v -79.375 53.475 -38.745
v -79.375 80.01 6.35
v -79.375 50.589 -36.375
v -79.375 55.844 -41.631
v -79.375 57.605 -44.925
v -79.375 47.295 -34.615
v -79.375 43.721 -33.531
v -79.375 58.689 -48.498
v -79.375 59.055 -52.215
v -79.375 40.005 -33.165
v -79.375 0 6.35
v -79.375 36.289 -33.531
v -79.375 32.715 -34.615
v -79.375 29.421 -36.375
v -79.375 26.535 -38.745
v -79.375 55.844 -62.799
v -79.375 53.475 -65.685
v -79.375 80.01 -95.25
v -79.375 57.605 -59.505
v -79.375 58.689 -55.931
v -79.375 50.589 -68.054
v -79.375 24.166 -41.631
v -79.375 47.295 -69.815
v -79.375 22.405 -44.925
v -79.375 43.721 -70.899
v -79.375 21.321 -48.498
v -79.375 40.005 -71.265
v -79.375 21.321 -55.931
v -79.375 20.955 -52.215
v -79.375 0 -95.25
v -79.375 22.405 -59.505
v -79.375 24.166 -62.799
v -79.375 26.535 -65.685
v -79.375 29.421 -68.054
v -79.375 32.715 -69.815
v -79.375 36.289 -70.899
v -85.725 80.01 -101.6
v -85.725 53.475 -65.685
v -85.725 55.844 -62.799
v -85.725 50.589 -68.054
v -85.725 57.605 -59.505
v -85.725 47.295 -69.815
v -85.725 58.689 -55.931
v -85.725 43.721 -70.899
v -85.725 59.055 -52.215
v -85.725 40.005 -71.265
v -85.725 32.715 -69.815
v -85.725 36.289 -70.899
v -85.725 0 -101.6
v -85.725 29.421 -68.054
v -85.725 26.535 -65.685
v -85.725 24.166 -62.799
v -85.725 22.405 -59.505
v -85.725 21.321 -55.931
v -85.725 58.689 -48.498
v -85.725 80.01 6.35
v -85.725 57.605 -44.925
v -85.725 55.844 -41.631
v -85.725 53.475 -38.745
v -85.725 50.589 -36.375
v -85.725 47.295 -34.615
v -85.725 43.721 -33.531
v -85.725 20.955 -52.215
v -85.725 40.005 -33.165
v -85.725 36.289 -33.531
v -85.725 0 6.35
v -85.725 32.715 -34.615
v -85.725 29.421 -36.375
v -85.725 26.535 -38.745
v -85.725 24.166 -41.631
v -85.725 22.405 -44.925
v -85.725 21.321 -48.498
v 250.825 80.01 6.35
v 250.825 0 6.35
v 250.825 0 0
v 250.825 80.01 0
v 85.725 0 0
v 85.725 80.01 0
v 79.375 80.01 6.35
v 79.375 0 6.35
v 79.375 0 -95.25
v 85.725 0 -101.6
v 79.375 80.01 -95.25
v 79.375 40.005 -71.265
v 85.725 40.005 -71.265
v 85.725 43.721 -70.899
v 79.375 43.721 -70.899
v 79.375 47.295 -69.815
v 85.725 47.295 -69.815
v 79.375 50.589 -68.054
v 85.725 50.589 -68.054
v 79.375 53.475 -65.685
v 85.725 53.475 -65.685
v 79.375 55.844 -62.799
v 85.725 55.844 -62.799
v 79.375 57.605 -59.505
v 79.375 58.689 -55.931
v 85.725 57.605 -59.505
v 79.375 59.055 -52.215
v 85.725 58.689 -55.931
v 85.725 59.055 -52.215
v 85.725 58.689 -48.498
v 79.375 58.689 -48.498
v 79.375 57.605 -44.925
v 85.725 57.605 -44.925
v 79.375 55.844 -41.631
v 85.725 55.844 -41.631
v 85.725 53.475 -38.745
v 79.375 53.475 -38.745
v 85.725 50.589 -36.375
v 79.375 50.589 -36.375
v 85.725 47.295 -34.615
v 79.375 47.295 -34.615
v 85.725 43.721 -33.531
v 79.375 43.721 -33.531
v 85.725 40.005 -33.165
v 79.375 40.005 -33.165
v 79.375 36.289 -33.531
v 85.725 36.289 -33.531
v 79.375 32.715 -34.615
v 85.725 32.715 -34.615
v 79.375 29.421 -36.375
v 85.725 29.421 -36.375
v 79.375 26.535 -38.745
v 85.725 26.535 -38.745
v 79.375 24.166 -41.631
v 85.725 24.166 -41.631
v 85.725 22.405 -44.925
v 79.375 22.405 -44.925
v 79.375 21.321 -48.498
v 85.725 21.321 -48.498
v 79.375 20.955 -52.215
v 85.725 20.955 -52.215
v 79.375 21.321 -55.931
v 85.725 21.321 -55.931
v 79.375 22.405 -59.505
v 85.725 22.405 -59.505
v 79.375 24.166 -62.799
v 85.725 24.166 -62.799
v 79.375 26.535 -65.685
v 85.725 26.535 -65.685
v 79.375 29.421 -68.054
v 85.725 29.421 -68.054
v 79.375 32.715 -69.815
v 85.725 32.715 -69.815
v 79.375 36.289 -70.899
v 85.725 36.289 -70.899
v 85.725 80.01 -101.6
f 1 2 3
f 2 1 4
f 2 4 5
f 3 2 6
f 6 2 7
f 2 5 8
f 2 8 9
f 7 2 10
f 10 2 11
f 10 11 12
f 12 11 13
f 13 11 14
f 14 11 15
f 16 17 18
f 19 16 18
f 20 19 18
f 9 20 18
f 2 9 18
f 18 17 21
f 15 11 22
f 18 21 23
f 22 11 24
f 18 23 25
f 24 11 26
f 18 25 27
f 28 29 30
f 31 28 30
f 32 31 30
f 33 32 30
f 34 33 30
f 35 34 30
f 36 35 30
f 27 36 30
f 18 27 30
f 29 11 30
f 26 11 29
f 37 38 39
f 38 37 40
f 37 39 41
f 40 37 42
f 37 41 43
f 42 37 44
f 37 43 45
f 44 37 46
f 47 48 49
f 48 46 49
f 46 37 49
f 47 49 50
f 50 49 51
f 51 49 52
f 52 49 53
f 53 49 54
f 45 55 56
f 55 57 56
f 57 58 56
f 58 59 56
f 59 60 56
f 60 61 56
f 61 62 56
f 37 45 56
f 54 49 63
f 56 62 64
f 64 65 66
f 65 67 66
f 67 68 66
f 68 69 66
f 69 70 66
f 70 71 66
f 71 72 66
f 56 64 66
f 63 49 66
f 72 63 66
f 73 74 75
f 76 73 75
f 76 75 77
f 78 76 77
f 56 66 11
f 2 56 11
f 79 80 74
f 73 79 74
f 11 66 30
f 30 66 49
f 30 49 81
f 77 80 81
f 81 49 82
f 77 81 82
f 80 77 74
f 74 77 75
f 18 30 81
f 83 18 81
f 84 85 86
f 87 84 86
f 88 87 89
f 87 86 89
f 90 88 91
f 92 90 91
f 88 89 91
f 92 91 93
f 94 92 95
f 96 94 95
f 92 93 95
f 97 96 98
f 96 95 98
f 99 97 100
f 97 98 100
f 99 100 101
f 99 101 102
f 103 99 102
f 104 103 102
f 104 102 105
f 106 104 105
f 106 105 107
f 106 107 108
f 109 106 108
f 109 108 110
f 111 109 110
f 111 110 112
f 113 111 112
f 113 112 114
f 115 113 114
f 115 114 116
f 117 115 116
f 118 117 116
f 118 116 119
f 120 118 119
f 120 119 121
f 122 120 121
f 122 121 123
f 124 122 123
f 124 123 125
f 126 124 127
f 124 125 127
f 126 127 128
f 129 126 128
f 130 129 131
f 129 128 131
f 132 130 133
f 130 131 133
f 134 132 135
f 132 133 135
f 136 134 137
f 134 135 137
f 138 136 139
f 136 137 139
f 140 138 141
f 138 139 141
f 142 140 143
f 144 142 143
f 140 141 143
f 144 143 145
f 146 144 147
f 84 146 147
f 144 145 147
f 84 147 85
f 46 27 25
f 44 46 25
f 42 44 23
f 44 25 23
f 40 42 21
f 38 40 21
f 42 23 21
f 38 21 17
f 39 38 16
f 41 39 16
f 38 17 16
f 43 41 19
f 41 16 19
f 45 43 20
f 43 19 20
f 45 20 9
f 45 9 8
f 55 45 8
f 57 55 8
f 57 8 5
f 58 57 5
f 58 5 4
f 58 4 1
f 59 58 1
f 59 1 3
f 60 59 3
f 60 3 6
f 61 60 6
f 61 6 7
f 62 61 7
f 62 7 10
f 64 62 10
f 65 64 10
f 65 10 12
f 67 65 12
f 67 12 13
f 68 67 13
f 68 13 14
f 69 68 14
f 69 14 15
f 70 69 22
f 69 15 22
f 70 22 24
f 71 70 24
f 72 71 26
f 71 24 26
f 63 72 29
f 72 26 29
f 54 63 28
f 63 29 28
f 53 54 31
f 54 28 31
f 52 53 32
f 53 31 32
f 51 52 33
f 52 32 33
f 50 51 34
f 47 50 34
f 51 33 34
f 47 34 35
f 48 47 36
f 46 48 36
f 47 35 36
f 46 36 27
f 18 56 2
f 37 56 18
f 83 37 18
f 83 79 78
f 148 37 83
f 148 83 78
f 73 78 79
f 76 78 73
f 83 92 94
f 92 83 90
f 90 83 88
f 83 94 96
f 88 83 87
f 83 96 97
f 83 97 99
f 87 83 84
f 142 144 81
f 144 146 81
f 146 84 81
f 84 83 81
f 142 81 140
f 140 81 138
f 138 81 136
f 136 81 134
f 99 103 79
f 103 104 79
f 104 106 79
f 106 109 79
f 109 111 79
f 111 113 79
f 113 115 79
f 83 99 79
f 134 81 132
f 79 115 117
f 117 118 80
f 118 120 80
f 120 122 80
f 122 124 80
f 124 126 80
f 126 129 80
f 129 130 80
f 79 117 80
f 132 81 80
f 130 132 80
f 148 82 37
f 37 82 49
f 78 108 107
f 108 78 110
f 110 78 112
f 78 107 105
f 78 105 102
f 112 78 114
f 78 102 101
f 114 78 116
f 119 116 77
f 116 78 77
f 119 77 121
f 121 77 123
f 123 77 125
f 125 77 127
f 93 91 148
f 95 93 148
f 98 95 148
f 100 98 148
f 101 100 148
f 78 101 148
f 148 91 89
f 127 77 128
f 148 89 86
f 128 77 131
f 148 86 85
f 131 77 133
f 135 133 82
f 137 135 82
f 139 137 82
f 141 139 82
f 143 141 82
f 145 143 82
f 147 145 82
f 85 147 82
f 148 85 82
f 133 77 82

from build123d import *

# Parameters (mm, degrees)
BOSS_EXTRUDE1_DEPTH = 80.01
SKETCH2_R           = 19.05
CUT_EXTRUDE1_DEPTH  = 175.768


with BuildPart() as part:
    # Sketch1 → Boss-Extrude1 (new body)
    with BuildSketch(Plane(origin=(0, 0, 0), x_dir=(1, 0, 0), z_dir=(0, 1, 0))):
        Polygon((85.725, 0), (85.725, 101.6), (-85.725, 101.6), (-85.725, -6.35), (-79.375, -6.35), (-79.375, 95.25), (79.375, 95.25), (79.375, -6.35), (110.08813222, -6.35), (250.825, -6.35), (250.825, 0), align=None)
    extrude(amount=BOSS_EXTRUDE1_DEPTH)

    # Sketch2 → Cut-Extrude1 (cut)
    with BuildSketch(Plane(origin=(85.725, 0, 0), x_dir=(0, 0, -1), z_dir=(1, 0, 0))):
        with Locations((52.214904531, 40.005)):
            Circle(SKETCH2_R)
    extrude(amount=-CUT_EXTRUDE1_DEPTH, mode=Mode.SUBTRACT)


solid = part.part
